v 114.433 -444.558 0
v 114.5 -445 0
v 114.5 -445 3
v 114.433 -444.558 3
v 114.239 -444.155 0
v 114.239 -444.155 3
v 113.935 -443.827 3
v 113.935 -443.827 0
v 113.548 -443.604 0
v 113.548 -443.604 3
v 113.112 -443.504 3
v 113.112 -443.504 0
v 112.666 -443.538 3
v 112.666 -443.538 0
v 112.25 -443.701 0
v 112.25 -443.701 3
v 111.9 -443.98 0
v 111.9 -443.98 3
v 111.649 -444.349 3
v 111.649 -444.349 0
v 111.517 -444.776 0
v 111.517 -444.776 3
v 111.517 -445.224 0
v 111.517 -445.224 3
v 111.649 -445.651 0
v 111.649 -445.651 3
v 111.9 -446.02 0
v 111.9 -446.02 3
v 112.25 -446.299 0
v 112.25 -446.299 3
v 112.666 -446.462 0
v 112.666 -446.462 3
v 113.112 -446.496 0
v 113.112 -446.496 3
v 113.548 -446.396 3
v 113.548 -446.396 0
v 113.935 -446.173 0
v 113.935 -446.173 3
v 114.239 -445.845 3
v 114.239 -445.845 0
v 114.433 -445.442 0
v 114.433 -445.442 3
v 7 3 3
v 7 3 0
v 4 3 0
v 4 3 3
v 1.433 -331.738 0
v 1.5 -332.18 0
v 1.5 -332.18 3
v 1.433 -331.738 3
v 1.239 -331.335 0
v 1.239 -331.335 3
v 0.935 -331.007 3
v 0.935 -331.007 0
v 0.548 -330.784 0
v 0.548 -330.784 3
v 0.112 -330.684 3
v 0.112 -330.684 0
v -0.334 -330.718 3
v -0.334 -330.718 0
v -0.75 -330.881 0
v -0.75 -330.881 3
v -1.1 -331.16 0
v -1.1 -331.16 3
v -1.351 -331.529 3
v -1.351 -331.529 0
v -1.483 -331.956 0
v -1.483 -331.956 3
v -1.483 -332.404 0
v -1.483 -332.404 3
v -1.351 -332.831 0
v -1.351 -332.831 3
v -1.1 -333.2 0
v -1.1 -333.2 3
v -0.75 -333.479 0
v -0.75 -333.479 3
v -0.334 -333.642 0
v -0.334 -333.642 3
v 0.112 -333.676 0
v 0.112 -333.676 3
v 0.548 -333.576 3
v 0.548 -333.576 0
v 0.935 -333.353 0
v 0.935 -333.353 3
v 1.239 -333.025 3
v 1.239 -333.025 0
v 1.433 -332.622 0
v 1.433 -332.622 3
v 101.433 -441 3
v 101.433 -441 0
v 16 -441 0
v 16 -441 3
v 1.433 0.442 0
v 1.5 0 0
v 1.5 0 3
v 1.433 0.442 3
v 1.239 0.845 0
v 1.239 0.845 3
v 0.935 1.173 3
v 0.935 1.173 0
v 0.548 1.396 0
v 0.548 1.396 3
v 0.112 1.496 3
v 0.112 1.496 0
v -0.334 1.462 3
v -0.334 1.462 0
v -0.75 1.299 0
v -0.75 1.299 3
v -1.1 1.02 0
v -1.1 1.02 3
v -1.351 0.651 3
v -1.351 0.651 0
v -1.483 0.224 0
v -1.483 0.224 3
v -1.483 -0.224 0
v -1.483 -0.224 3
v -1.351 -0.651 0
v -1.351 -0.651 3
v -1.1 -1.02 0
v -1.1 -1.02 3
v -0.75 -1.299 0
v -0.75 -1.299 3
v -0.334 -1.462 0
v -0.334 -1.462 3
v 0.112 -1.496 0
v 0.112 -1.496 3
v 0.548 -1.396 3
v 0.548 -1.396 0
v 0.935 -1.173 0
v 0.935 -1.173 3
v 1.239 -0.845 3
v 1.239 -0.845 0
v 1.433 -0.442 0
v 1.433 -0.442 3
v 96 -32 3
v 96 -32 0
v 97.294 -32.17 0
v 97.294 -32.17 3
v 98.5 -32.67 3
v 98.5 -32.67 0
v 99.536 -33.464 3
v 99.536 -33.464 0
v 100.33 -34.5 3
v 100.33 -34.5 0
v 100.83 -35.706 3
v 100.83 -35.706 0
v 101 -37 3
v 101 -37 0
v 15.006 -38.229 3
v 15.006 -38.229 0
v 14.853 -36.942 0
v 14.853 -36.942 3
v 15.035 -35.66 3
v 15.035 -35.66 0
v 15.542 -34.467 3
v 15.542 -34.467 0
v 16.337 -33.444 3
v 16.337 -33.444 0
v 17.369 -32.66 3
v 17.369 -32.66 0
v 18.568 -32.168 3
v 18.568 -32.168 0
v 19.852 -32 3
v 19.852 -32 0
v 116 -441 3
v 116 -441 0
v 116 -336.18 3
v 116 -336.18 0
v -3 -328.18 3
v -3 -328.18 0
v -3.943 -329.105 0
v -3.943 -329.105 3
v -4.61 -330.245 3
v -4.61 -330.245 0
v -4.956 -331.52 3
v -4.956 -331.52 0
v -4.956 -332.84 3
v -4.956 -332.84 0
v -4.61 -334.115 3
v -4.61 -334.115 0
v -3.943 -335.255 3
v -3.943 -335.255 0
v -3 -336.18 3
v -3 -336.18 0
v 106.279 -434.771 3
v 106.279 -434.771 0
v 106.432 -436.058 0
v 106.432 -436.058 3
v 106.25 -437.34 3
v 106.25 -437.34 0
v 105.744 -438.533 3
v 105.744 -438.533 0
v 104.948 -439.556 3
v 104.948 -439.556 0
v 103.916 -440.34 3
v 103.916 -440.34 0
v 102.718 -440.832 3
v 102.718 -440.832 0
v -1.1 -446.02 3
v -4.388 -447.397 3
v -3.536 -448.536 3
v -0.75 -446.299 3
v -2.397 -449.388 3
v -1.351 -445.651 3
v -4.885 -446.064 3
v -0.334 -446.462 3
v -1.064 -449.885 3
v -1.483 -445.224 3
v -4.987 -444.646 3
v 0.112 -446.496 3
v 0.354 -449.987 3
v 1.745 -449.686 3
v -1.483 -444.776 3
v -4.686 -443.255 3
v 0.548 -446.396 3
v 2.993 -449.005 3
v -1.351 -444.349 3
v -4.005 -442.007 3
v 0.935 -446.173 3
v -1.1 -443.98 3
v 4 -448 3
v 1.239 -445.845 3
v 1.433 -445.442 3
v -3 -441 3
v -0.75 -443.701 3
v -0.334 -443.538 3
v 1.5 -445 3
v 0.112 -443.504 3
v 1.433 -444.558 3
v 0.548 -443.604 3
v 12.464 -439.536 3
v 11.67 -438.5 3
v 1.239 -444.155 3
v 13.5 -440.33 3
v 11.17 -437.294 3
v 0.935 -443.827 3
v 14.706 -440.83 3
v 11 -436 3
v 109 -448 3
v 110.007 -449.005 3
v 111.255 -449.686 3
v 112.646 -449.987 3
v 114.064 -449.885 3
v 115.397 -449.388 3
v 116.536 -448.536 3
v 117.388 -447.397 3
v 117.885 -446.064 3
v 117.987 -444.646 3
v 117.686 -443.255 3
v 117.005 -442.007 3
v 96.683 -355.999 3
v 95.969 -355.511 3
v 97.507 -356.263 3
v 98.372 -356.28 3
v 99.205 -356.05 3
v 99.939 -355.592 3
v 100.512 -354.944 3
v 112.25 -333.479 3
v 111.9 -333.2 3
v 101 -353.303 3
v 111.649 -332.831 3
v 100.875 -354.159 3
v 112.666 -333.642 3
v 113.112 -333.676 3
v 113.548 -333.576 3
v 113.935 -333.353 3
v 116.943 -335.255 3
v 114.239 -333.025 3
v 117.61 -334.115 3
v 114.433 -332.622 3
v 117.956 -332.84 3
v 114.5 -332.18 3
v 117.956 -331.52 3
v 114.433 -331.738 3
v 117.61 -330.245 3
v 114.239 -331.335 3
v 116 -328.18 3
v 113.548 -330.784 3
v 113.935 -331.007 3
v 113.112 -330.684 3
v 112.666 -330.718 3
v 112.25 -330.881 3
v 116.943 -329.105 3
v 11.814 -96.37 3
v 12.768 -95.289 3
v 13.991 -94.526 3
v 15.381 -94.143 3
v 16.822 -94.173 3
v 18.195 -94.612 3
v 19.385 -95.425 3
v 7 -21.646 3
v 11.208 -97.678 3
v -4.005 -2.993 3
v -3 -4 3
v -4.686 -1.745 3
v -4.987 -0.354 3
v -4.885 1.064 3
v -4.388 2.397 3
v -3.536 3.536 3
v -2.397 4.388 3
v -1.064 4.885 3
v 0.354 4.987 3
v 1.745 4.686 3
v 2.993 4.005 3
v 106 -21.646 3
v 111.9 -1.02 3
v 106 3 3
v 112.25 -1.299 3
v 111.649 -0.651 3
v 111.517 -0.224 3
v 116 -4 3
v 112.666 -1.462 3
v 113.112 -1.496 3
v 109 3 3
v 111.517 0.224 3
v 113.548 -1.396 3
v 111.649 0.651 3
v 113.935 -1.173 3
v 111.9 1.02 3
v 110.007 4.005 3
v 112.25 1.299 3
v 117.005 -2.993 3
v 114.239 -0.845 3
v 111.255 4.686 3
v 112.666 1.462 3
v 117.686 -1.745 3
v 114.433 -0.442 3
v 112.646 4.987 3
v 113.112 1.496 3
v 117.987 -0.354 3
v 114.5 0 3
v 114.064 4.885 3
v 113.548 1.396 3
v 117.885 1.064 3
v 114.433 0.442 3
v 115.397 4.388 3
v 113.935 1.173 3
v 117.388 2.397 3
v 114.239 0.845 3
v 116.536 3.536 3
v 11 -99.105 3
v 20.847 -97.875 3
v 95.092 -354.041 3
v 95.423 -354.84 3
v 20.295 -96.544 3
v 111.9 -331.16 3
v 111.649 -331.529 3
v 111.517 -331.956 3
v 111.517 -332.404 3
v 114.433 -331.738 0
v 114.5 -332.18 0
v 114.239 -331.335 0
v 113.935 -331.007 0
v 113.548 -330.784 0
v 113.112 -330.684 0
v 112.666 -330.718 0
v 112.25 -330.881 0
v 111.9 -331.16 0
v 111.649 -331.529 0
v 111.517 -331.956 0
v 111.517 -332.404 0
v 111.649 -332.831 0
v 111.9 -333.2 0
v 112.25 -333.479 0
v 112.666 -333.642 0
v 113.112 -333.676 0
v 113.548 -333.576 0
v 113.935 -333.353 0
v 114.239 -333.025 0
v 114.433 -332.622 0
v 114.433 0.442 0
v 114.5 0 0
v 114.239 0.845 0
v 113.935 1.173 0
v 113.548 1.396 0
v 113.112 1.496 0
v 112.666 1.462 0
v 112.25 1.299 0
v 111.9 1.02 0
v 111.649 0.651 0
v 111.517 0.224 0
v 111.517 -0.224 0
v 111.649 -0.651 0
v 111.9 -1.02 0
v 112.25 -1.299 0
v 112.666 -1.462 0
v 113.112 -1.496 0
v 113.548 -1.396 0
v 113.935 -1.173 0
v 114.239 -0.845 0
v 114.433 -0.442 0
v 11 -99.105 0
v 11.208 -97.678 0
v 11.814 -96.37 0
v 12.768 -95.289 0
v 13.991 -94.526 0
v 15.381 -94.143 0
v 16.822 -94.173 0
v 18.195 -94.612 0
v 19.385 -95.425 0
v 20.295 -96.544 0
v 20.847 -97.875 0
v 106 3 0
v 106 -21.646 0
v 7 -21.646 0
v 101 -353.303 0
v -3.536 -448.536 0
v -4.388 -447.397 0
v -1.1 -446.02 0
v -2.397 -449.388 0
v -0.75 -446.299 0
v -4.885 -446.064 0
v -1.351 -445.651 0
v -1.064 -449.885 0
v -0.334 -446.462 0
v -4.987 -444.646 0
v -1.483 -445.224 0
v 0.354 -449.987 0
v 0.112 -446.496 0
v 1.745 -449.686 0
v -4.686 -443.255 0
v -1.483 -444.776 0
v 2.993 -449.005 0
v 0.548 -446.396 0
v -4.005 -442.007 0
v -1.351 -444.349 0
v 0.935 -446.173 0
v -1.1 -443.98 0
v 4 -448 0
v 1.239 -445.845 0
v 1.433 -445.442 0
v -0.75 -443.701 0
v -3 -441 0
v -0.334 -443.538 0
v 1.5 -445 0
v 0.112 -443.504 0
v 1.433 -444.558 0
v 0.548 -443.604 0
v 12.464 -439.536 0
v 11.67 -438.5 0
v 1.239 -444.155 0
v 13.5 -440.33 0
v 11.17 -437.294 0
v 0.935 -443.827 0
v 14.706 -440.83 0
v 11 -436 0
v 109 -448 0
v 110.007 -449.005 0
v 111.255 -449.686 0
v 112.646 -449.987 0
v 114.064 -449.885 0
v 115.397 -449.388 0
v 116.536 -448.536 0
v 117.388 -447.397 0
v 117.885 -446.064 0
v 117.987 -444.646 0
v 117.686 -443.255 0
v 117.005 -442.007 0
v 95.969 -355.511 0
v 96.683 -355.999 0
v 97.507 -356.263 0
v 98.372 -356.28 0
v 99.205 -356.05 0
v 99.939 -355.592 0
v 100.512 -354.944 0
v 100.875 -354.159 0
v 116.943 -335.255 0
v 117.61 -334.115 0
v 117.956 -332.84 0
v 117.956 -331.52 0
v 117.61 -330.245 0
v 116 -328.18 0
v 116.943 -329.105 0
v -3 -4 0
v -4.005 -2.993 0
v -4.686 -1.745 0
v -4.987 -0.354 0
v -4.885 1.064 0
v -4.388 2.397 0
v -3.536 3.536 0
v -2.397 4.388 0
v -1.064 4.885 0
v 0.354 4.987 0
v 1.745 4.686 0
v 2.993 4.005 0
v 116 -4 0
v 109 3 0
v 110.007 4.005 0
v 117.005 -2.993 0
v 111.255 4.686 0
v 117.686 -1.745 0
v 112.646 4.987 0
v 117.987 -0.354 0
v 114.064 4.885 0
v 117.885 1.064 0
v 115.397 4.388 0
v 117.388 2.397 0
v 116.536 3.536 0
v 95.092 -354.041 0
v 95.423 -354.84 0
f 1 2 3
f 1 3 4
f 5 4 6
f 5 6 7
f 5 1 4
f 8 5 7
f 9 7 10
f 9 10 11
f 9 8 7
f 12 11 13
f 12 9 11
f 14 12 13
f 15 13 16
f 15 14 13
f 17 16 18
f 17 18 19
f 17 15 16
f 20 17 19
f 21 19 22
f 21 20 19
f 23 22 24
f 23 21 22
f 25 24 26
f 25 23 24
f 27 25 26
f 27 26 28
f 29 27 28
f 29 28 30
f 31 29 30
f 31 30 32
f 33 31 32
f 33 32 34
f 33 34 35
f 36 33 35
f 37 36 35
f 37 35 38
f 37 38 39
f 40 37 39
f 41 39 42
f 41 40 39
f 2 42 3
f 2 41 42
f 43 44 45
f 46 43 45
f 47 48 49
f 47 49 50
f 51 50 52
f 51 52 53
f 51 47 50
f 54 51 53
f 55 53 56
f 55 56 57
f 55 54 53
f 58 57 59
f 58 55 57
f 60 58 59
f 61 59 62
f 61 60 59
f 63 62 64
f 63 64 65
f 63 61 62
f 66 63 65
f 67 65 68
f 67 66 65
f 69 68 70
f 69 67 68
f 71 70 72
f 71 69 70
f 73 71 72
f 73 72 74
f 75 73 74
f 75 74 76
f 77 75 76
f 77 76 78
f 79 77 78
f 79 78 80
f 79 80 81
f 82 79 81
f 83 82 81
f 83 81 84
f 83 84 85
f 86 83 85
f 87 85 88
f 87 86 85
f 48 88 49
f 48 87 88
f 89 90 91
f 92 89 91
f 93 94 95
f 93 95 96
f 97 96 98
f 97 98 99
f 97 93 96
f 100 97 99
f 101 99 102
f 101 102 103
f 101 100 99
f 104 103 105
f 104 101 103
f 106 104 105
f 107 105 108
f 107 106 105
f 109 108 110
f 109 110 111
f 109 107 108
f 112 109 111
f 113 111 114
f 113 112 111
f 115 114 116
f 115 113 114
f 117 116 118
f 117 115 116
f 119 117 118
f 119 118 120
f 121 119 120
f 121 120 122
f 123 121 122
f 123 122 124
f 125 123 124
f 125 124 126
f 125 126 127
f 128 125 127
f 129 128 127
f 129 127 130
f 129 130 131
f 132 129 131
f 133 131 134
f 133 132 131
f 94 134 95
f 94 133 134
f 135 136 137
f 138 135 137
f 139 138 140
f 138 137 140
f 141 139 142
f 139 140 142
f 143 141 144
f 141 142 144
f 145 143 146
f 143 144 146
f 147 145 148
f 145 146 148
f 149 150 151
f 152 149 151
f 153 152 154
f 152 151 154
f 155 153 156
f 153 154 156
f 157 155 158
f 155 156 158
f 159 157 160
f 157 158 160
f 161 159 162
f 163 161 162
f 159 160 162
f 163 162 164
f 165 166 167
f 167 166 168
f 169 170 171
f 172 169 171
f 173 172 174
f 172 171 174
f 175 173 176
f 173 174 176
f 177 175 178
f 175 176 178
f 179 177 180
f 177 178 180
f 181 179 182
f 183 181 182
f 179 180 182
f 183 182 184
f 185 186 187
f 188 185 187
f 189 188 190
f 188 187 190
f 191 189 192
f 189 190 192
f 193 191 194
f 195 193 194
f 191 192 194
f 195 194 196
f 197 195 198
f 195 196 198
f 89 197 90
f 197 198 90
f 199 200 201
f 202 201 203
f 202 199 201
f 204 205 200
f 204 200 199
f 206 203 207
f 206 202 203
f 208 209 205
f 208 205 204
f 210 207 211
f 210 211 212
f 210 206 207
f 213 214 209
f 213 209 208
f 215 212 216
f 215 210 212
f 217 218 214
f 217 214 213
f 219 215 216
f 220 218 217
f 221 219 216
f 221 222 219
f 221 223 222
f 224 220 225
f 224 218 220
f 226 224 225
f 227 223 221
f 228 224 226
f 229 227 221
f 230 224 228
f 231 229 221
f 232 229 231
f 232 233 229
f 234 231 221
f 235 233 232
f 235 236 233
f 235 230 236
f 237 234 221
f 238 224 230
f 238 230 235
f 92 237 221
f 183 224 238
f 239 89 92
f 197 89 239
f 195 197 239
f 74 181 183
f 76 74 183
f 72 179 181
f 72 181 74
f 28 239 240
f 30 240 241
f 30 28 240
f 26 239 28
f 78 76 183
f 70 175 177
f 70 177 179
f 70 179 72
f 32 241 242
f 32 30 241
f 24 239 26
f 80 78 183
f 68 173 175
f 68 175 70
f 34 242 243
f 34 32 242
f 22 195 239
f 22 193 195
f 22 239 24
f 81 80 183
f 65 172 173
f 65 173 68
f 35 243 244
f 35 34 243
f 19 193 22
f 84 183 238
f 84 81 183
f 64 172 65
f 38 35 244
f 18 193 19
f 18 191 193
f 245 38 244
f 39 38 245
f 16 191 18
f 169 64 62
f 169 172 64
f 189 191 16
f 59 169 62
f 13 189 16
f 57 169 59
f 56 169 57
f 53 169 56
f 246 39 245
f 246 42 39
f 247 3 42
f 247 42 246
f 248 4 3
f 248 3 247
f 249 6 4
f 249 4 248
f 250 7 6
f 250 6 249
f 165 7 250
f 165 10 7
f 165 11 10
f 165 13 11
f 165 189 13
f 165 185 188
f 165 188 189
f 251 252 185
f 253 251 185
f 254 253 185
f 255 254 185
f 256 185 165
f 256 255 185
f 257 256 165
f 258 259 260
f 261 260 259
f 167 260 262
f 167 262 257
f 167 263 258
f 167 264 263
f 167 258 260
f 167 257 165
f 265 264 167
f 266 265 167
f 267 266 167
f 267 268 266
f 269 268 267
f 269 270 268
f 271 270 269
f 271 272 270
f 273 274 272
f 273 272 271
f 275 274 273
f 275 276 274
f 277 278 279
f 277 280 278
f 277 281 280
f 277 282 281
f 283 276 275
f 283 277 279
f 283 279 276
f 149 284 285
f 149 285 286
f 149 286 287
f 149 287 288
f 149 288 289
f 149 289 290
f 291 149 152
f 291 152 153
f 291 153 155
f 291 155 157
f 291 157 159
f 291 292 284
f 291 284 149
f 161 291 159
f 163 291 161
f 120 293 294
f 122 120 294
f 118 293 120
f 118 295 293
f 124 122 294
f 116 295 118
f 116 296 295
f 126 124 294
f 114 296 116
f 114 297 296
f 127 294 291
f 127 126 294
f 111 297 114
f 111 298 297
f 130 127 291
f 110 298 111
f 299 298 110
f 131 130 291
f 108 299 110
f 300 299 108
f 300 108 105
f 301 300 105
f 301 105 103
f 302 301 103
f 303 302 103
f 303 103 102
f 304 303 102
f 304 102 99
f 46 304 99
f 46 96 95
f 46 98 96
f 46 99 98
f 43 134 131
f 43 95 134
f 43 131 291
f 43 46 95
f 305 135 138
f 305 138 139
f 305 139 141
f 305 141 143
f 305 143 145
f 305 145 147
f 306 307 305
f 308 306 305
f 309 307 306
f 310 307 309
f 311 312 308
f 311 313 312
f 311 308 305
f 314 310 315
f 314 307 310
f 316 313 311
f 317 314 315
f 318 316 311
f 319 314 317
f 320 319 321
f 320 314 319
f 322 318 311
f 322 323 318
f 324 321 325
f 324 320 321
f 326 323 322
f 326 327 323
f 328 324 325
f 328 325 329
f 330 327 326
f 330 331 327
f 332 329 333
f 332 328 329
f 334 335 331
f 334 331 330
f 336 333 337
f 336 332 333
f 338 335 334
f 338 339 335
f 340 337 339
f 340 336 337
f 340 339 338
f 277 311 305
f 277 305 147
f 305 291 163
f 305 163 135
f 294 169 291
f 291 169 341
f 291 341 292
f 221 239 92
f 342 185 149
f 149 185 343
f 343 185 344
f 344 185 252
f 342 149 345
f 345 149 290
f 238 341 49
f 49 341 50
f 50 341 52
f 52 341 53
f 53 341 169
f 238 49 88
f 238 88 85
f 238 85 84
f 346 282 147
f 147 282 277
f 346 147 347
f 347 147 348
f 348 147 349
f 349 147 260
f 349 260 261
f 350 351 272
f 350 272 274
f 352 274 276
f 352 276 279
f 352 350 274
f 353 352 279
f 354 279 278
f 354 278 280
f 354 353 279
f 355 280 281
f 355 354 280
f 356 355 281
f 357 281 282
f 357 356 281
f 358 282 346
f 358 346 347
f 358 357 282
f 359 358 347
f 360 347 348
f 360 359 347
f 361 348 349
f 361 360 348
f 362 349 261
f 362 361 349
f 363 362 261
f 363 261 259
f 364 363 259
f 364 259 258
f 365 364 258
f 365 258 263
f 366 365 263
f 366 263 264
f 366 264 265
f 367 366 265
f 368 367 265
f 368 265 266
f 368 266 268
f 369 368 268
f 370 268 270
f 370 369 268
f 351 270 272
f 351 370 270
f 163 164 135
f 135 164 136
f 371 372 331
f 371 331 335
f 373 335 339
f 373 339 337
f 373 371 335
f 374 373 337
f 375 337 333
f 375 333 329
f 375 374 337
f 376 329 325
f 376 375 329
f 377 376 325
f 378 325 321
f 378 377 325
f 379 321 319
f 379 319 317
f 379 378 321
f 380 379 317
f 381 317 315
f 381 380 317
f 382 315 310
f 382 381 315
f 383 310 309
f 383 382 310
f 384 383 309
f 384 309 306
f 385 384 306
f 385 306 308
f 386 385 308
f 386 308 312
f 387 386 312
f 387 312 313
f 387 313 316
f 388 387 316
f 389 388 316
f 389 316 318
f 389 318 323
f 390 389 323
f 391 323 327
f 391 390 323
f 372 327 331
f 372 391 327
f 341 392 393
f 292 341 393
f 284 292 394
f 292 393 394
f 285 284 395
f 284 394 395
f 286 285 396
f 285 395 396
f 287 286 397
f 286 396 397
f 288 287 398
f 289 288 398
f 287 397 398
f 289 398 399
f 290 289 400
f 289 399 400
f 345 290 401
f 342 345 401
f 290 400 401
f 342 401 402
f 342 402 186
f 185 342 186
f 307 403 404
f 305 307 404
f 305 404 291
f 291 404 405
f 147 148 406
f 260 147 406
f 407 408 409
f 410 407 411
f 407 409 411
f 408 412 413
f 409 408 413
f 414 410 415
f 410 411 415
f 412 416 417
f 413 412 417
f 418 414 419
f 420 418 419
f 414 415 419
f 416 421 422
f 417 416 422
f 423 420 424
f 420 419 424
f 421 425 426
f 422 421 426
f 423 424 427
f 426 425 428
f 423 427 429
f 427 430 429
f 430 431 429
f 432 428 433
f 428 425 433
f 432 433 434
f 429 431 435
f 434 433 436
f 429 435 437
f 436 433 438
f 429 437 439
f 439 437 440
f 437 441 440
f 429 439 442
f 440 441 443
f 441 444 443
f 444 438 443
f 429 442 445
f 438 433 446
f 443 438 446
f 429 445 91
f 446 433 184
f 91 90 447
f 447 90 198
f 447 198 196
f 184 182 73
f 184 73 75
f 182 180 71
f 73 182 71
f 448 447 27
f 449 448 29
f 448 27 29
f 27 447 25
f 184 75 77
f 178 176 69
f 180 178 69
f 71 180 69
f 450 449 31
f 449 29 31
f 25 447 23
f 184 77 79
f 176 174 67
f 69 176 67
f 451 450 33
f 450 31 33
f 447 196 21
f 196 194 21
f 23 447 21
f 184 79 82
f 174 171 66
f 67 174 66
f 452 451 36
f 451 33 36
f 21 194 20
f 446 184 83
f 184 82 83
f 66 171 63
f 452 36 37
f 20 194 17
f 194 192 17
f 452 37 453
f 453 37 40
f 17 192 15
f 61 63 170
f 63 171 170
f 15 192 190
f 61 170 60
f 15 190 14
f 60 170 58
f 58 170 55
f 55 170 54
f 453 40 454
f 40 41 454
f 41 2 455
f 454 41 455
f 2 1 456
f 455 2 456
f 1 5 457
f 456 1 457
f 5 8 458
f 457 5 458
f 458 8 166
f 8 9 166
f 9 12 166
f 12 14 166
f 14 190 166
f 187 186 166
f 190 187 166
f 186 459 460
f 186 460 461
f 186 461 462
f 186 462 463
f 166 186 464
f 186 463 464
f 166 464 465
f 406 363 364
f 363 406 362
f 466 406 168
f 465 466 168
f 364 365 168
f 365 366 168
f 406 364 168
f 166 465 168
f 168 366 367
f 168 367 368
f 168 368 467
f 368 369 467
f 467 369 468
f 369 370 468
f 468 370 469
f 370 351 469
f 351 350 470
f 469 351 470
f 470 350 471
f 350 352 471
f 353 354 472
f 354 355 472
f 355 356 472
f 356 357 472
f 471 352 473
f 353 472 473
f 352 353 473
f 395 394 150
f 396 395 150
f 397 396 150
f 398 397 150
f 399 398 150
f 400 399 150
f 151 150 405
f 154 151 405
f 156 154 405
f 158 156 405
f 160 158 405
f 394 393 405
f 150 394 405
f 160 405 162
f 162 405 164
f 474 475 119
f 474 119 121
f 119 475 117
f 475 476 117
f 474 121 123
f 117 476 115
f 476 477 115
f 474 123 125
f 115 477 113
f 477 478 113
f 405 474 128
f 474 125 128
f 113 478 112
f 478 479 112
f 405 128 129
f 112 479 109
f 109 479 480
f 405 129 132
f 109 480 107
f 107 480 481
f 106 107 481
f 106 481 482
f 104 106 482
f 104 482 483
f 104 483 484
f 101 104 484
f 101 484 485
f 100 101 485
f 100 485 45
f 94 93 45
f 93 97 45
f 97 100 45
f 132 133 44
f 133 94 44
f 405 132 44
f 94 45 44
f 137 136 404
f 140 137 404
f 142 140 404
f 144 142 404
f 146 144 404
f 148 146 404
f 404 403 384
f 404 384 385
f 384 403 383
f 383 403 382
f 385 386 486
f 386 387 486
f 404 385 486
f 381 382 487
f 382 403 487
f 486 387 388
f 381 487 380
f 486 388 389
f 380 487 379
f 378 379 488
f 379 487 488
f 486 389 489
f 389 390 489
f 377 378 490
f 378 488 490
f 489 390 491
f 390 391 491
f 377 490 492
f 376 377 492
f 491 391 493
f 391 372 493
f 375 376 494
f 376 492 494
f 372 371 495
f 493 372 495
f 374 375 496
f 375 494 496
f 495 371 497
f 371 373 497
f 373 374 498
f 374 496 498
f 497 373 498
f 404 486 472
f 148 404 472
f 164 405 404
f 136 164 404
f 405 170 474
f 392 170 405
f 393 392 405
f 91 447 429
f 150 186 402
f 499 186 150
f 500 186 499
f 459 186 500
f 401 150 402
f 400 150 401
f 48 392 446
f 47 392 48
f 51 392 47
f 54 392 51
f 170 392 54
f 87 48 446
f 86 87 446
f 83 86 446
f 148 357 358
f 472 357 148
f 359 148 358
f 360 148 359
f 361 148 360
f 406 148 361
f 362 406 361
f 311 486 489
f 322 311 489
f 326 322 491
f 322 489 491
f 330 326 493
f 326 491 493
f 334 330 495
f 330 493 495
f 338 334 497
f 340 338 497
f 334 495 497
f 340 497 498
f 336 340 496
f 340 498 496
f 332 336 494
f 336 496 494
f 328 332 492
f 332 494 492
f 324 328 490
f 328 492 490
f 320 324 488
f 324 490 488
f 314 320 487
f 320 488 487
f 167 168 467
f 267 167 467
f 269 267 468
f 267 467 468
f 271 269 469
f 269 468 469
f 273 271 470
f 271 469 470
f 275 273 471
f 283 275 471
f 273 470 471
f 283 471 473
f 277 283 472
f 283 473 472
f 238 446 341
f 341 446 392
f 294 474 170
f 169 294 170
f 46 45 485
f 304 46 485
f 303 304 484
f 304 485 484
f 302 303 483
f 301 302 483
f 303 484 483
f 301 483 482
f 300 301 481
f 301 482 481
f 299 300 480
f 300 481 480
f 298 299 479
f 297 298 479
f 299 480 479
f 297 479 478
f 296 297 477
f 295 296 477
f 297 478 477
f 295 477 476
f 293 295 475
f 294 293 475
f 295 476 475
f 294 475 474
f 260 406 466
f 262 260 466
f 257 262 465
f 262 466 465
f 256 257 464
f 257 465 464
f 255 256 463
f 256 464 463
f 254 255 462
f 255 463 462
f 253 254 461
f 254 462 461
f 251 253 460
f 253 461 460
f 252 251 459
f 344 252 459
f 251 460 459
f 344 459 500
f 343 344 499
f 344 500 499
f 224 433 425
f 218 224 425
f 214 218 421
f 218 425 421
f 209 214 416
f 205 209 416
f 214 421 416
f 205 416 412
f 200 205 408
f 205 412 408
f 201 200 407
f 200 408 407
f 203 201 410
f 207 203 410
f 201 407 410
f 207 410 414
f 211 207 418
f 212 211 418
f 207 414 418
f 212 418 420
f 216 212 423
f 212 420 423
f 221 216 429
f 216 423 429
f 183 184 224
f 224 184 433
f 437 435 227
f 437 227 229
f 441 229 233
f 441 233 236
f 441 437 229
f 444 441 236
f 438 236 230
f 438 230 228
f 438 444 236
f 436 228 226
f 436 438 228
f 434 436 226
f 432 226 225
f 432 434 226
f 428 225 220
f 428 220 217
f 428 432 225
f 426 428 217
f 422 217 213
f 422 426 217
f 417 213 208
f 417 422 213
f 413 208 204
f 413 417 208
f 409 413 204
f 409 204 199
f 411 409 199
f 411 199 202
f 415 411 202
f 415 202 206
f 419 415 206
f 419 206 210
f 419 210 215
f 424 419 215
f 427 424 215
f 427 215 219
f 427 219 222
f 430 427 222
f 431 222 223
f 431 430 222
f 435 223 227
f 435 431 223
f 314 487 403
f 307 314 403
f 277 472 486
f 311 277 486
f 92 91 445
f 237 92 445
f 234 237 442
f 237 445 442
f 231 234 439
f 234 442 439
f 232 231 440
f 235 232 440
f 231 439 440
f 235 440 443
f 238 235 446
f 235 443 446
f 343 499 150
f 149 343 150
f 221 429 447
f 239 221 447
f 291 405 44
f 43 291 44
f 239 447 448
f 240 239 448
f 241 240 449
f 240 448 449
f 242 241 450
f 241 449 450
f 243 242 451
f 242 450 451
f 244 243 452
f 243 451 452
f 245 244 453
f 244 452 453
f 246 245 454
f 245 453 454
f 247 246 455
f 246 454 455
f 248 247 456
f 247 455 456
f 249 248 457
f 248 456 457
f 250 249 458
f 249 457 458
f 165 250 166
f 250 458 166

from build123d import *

# Parameters (mm, degrees)
SKETCH_1_R      = 1.5
EXTRUDE_1_DEPTH = 3


with BuildPart() as part:
    # 草图1 → 凸台-拉伸1 (new body)
    with BuildSketch(Plane.XY):
        with BuildLine():
            Line((116, -441), (116, -336.18))
            ThreePointArc((116, -336.18), (118, -332.18), (116, -328.18))
            Line((116, -328.18), (116, -4))
            ThreePointArc((116, -4), (116.535533906, 3.535533906), (109, 3))
            Line((109, 3), (106, 3))
            Line((106, 3), (106, -21.645755349))
            Line((106, -21.645755349), (7, -21.645755349))
            Line((7, -21.645755349), (7, 3))
            Line((7, 3), (4, 3))
            ThreePointArc((4, 3), (-3.535533906, 3.535533906), (-3, -4))
            Line((-3, -4), (-3, -328.18))
            ThreePointArc((-3, -328.18), (-5, -332.18), (-3, -336.18))
            Line((-3, -336.18), (-3, -441))
            ThreePointArc((-3, -441), (-3.535533906, -448.535533906), (4, -448))
            Line((4, -448), (109, -448))
            ThreePointArc((109, -448), (116.535533906, -448.535533906), (116, -441))
        make_face()
        Circle(SKETCH_1_R, mode=Mode.SUBTRACT)
        with Locations((113, 0)):
            Circle(SKETCH_1_R, mode=Mode.SUBTRACT)
        with Locations((113, -445)):
            Circle(SKETCH_1_R, mode=Mode.SUBTRACT)
        with Locations((0, -445)):
            Circle(SKETCH_1_R, mode=Mode.SUBTRACT)
        with Locations((0, -332.18)):
            Circle(SKETCH_1_R, mode=Mode.SUBTRACT)
        with Locations((113, -332.18)):
            Circle(SKETCH_1_R, mode=Mode.SUBTRACT)
        with BuildLine():
            Line((101, -37), (101, -353.3033361))
            ThreePointArc((101, -353.3033361), (98.371573189, -356.280236059), (95.092044423, -354.040760242))
            Line((95.092044423, -354.040760242), (15.005818776, -38.229040236))
            ThreePointArc((15.005818776, -38.229040236), (15.906197954, -33.929592957), (19.852411404, -32))
            Line((19.852411404, -32), (96, -32))
            ThreePointArc((96, -32), (99.535533906, -33.464466094), (101, -37))
        make_face(mode=Mode.SUBTRACT)
        with BuildLine():
            Line((20.846592628, -97.875461369), (106.279422364, -434.770959764))
            ThreePointArc((106.279422364, -434.770959764), (105.379043186, -439.070407043), (101.432829737, -441))
            Line((101.432829737, -441), (16, -441))
            ThreePointArc((16, -441), (12.464466094, -439.535533906), (11, -436))
            Line((11, -436), (11, -99.104501604))
            ThreePointArc((11, -99.104501604), (15.380711351, -94.143001673), (20.846592628, -97.875461369))
        make_face(mode=Mode.SUBTRACT)
    extrude(amount=EXTRUDE_1_DEPTH)


solid = part.part
